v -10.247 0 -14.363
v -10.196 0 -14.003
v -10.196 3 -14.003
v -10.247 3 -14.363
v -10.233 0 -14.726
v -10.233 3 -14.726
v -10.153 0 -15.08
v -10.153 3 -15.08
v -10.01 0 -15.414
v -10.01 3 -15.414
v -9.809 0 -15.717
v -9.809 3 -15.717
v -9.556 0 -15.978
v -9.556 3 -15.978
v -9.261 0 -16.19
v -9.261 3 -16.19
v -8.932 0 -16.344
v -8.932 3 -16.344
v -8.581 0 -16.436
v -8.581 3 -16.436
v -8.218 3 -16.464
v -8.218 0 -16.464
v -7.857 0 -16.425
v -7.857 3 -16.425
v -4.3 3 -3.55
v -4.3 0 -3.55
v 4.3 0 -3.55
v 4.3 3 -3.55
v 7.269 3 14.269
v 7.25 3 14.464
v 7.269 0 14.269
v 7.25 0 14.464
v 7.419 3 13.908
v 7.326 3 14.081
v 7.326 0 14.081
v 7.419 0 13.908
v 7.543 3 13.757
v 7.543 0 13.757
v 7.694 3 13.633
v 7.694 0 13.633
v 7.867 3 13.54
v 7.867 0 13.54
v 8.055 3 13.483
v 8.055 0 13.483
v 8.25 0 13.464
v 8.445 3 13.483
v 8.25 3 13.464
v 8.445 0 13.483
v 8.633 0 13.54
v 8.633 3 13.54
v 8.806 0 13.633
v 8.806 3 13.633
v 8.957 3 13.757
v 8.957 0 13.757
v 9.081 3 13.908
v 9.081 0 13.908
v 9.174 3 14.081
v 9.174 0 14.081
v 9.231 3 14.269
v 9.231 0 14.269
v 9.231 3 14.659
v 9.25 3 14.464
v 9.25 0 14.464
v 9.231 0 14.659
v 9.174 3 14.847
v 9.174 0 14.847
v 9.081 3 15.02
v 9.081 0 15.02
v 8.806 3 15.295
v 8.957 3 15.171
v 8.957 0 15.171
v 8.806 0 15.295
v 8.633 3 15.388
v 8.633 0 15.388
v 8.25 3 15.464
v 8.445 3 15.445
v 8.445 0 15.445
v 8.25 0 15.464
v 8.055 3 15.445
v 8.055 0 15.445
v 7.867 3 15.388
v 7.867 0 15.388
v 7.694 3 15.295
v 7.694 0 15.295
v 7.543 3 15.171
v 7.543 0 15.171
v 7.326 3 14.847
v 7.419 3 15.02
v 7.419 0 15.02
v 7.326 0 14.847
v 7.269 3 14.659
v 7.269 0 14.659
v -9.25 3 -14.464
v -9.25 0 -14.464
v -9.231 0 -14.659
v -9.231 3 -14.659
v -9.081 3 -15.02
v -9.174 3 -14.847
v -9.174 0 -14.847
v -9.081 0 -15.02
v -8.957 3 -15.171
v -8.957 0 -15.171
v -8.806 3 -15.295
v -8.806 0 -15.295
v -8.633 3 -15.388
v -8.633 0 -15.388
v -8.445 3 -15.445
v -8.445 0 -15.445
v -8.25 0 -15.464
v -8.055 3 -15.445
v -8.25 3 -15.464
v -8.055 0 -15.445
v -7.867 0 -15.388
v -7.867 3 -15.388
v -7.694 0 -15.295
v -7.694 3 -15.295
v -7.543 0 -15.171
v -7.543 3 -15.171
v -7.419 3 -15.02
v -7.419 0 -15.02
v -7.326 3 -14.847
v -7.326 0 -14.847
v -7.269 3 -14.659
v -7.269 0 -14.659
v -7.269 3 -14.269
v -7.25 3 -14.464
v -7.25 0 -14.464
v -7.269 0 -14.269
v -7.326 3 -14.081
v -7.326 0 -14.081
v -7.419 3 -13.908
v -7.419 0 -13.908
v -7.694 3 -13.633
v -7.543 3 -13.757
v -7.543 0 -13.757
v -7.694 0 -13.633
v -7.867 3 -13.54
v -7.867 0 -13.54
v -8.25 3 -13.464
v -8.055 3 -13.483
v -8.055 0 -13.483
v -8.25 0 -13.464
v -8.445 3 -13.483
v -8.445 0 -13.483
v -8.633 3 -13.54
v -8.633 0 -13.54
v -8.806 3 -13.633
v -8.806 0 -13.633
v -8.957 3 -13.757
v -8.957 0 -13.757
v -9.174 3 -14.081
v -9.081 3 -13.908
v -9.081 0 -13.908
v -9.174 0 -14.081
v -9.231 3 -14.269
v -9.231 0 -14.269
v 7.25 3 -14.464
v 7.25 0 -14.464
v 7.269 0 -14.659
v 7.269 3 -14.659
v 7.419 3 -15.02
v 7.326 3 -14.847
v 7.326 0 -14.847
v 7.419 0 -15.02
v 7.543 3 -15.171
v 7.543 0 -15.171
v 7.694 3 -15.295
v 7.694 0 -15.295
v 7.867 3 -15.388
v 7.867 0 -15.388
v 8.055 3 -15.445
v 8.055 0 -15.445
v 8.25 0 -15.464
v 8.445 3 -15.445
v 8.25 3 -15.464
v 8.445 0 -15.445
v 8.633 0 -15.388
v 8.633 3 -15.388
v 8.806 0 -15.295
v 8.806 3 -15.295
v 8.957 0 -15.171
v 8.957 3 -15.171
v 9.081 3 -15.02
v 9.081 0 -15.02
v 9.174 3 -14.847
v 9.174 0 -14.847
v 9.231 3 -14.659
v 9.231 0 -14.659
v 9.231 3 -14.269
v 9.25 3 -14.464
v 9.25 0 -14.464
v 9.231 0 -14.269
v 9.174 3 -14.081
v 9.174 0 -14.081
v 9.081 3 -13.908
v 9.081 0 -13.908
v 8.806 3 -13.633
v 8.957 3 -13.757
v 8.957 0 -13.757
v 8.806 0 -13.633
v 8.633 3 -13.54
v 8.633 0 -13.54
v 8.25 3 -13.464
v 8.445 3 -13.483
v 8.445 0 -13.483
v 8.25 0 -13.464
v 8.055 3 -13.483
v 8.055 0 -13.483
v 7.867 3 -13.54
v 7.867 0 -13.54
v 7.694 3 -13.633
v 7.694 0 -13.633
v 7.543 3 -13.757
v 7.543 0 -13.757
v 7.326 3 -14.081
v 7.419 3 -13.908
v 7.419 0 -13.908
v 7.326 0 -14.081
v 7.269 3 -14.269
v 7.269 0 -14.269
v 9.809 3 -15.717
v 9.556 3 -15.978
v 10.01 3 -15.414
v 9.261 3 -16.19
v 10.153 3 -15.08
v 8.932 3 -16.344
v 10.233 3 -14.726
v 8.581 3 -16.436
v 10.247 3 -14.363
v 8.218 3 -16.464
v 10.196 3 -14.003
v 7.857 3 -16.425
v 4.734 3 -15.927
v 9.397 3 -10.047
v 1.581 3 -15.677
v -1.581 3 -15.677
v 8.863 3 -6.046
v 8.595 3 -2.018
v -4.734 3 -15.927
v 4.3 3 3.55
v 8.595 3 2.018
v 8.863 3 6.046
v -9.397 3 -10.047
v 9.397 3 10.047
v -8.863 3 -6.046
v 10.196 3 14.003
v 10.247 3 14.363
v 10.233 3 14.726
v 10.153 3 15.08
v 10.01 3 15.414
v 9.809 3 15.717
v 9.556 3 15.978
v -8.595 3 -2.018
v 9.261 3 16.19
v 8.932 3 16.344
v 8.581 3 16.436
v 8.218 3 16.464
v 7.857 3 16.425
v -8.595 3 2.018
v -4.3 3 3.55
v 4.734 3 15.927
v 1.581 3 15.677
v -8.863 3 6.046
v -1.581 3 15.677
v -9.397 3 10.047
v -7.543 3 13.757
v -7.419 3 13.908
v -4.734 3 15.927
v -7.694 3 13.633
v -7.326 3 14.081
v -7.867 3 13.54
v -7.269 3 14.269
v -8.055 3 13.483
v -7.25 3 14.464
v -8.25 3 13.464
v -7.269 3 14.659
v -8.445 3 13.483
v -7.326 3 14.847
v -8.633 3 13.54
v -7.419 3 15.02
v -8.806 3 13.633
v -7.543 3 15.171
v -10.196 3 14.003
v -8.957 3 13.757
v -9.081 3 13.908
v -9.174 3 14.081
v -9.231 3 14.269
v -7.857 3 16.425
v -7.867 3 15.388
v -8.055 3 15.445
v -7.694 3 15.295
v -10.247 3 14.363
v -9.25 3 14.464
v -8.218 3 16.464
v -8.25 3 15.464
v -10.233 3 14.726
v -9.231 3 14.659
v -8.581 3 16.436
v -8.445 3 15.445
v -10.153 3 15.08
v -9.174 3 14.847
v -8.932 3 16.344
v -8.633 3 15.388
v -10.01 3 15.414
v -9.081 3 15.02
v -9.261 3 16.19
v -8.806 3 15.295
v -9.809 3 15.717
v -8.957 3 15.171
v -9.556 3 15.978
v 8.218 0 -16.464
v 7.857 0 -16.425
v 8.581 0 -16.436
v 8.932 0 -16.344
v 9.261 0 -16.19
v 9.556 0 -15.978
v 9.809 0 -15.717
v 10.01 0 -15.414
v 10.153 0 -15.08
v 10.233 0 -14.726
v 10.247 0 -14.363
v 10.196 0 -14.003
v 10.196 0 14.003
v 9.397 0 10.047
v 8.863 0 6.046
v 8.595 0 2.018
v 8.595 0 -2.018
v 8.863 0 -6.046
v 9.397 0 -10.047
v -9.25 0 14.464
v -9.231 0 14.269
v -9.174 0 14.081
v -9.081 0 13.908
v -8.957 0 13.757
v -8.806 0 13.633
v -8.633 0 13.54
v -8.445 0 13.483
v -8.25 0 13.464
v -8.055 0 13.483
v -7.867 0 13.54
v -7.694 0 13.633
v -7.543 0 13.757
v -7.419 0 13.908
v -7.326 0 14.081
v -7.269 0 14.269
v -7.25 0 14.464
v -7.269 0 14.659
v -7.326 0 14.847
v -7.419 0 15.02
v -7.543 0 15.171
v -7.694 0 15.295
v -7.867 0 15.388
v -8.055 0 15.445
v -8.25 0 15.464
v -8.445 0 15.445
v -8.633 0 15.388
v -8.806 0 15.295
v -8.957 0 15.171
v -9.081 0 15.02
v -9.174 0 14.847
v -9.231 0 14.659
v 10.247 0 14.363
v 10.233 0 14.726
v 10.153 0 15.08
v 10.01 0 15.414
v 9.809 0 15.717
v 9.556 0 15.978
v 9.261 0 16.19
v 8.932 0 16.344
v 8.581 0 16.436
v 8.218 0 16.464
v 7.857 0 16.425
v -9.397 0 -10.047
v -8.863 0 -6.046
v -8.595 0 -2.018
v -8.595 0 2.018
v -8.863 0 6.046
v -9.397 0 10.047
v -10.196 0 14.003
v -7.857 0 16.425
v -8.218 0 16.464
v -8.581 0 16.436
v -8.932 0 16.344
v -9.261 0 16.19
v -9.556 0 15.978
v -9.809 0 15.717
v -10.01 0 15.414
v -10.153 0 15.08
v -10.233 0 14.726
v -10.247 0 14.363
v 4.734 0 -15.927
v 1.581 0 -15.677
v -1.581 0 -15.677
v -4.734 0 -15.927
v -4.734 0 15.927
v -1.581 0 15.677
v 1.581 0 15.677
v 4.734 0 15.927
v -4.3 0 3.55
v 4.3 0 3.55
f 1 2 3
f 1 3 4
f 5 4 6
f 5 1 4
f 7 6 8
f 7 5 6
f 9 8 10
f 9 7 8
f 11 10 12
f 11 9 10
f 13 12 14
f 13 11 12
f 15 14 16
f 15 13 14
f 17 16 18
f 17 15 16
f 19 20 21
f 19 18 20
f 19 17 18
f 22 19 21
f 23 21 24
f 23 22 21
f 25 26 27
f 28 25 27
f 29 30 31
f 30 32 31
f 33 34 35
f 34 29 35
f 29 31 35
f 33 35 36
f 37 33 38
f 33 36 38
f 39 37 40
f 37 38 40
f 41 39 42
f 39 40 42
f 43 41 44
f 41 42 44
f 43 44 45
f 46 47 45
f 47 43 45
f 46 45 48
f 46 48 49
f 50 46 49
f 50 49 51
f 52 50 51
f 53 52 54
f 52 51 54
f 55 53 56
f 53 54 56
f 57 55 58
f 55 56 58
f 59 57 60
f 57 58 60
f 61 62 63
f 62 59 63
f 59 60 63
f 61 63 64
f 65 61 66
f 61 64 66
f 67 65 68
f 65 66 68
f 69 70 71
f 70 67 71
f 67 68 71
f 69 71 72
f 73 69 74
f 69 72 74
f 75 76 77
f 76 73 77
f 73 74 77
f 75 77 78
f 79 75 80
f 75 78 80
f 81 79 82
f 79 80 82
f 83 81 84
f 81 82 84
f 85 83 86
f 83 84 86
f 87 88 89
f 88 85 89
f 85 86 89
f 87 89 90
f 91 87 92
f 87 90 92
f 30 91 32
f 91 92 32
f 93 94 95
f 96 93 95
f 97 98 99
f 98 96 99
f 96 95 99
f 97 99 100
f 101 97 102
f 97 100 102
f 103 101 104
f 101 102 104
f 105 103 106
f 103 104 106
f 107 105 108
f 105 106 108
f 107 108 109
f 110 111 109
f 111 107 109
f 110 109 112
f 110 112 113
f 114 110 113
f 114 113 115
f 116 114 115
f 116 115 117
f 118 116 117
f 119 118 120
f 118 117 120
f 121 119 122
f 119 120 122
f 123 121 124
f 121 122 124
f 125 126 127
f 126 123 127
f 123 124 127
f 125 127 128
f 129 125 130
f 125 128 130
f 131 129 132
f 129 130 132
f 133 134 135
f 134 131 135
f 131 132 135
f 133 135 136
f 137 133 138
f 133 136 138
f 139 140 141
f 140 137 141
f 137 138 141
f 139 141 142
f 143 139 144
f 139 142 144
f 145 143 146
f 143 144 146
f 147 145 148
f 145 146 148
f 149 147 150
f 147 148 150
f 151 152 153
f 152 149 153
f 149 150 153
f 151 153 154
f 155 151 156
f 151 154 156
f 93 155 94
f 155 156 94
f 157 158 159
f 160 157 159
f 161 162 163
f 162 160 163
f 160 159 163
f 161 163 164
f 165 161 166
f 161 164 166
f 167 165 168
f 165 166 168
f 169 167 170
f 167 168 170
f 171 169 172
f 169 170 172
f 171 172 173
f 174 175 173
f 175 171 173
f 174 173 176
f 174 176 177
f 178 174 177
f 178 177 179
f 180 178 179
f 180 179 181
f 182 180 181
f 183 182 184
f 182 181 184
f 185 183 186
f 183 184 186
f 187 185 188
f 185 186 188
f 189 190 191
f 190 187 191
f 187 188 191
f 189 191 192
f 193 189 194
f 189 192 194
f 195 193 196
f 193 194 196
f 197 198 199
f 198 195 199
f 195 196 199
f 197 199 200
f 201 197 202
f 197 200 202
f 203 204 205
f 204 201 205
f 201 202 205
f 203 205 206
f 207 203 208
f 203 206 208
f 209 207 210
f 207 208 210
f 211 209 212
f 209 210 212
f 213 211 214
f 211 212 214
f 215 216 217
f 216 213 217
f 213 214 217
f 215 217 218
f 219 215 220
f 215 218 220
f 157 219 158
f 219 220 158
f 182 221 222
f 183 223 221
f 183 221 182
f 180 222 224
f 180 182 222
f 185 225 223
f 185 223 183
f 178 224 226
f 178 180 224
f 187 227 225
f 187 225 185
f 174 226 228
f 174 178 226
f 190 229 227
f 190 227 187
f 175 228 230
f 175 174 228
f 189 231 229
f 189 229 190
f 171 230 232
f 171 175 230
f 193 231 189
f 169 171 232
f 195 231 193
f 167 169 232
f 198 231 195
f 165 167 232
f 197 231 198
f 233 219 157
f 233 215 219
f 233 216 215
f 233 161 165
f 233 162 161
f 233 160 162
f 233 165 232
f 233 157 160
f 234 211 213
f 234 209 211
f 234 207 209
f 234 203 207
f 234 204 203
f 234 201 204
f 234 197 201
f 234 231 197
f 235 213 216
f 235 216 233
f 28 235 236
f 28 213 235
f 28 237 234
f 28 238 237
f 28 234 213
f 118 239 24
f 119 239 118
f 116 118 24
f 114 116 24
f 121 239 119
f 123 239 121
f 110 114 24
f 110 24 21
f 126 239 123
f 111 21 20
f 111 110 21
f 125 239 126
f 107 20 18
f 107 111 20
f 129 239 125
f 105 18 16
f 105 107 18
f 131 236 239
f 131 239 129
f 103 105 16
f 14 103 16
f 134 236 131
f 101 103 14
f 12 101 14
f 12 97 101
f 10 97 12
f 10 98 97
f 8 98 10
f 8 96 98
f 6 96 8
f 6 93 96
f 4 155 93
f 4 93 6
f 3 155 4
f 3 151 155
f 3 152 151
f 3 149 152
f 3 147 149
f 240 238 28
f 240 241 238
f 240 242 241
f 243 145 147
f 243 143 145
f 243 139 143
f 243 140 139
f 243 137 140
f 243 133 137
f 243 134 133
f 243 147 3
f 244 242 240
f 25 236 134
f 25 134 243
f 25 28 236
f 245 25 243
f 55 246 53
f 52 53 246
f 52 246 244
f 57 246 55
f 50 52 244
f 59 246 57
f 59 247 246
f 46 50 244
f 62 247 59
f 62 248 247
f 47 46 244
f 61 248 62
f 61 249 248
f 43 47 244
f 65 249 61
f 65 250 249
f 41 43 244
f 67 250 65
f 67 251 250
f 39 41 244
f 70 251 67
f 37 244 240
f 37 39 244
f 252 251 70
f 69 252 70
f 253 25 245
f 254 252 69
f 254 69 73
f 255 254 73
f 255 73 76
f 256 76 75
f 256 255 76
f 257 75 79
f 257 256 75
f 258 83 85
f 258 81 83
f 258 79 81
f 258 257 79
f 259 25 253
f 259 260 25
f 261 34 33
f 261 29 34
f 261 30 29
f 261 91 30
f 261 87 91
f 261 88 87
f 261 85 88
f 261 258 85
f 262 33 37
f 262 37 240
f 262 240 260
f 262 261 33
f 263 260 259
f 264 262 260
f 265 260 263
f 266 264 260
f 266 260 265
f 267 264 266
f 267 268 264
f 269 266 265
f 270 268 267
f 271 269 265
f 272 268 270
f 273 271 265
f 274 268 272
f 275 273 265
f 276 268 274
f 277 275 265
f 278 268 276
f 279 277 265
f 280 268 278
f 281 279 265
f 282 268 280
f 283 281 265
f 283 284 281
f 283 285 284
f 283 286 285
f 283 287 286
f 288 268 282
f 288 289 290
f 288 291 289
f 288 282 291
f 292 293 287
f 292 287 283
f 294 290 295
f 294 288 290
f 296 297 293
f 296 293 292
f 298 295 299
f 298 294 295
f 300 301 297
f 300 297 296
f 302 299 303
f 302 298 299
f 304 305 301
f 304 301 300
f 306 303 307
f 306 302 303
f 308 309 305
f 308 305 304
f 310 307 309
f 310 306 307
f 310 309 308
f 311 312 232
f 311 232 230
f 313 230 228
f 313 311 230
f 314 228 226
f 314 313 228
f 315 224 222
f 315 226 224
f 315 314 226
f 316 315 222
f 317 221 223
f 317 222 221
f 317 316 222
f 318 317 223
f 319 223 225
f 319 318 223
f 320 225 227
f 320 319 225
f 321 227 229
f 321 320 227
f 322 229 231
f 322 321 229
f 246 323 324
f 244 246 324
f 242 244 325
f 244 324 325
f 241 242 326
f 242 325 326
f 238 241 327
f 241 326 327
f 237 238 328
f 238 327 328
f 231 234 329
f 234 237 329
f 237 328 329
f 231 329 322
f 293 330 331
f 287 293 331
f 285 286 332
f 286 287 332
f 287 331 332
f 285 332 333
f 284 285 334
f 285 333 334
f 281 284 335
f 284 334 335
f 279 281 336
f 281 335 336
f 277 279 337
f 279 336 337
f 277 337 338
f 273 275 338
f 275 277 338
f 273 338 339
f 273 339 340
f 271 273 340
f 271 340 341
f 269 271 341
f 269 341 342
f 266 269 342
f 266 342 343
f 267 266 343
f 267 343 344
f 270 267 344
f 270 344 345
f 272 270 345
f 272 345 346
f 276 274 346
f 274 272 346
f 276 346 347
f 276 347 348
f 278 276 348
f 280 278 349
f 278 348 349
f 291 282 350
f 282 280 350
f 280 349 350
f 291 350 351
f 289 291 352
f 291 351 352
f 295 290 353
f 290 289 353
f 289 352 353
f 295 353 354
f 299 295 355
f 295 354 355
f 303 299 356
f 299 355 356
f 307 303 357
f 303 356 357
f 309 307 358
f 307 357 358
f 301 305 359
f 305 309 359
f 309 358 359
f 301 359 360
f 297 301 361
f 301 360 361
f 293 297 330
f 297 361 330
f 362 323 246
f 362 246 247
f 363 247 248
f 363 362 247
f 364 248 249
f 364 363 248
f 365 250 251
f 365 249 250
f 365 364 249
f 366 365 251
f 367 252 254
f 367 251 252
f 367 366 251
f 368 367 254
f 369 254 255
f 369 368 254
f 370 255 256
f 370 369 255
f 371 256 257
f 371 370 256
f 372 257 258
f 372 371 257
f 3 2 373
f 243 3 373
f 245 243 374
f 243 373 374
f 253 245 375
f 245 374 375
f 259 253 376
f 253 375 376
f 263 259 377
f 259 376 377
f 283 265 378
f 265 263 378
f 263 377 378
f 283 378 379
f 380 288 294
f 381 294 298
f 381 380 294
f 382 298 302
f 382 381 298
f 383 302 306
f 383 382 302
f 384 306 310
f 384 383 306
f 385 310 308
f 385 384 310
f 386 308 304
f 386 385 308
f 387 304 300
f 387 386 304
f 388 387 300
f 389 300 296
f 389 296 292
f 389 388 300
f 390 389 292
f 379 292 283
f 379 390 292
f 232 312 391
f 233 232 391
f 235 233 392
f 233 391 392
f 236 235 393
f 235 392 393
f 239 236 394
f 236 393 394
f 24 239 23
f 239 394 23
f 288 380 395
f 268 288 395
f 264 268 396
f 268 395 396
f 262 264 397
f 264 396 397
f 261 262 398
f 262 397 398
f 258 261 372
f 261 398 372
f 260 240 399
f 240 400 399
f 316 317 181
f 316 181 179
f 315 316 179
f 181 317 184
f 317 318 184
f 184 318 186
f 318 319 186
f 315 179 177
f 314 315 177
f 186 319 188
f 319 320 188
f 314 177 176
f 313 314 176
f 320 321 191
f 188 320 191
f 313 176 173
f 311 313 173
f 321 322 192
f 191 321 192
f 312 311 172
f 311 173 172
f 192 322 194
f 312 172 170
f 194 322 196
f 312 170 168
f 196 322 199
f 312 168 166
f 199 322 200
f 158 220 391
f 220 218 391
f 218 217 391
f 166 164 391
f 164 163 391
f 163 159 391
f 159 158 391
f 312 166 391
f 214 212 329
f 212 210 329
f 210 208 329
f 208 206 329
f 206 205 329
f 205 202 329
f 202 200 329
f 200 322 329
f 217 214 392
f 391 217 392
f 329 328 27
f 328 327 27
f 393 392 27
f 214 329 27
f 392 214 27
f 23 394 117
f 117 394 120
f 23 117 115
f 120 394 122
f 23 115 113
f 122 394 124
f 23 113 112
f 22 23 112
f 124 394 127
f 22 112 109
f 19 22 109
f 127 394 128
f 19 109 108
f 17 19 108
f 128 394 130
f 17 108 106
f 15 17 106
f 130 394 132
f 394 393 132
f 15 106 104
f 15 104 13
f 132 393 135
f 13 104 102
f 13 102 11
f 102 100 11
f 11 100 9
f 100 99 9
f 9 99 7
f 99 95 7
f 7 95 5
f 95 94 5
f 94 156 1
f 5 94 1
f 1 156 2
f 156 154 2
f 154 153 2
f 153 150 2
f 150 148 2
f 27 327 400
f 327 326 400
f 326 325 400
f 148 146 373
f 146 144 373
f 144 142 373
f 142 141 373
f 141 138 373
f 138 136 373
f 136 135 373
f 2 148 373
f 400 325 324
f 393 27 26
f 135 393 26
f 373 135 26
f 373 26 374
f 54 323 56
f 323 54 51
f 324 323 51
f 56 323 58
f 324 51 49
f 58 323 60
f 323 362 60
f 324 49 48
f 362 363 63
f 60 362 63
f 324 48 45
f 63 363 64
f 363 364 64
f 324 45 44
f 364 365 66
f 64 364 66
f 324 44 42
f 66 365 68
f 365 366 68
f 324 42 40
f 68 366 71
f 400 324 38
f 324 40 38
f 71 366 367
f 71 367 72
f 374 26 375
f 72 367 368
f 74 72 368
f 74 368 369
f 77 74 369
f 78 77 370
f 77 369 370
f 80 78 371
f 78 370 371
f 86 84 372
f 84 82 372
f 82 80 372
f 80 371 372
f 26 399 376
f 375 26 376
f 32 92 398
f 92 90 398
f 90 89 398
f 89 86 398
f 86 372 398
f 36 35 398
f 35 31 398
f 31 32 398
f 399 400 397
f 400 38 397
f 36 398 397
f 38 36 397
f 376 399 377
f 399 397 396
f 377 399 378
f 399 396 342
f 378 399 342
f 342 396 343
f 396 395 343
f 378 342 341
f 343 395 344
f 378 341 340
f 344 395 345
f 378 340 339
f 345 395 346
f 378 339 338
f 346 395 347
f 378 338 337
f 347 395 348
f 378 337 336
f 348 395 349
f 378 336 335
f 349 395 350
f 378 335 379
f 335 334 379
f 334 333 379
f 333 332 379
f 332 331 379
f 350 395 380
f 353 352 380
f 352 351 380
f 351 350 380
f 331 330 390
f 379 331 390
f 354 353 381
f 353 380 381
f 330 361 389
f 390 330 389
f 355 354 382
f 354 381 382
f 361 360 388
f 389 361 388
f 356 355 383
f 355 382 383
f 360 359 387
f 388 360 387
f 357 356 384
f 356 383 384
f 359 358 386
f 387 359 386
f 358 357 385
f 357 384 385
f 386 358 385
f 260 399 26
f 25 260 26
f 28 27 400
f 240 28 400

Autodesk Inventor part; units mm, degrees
ref_plane "YZ Plane" through (0, 0, 0) normal (1, 0, 0) x (0, 1, 0)
ref_plane "XZ Plane" through (0, 0, 0) normal (0, 1, 0) x (-1, 0, 0)
ref_plane "XY Plane" through (0, 0, 0) normal (0, 0, 1) x (1, 0, 0)
sketch "Sketch1" plane through (0, 0, 0) normal (0, 1, 0) x (-1, 0, 0)
  line L0 (-8.25, 14.464) -> (8.25, 14.464) construction
  line L1 (8.25, 14.464) -> (8.25, -14.464) construction
  line L2 (8.25, -14.464) -> (-8.25, -14.464) construction
  line L3 (-8.25, -14.464) -> (-8.25, 14.464) construction
  line L4 (-8.25, 14.464) -> (8.25, -14.464) construction
  line L5 (8.25, 14.464) -> (-8.25, -14.464) construction
  circle A0 centre (8.25, 14.464) radius 1
  circle A1 centre (8.25, -14.464) radius 1
  circle A2 centre (-8.25, -14.464) radius 1
  circle A3 centre (-8.25, 14.464) radius 1
  line L6 (-4.3, 3.55) -> (4.3, 3.55)
  line L7 (4.3, 3.55) -> (4.3, -3.55)
  line L8 (4.3, -3.55) -> (-4.3, -3.55)
  line L9 (-4.3, -3.55) -> (-4.3, 3.55)
  line L10 (-4.3, 3.55) -> (4.3, -3.55) construction
  line L11 (4.3, 3.55) -> (-4.3, -3.55) construction
  circle A4 centre (8.25, 14.464) radius 2
  circle A5 centre (8.25, -14.464) radius 2
  circle A6 centre (-8.25, -14.464) radius 2
  circle A7 centre (-8.25, 14.464) radius 2
  arc A8 (10.1962, 14.0034) -> (10.1962, -14.0034) centre (69.3616, 0) ccw
  arc A9 (-10.1962, -14.0034) -> (-10.1962, 14.0034) centre (-69.3616, 0) ccw
  arc A10 (7.8571, -16.425) -> (-7.8571, -16.425) centre (0, -55.6458) ccw
  arc A11 (-7.8571, 16.425) -> (7.8571, 16.425) centre (0, 55.6458) ccw
  point P0 (0, 0)
  dimension "d0" = 16.5
  dimension "d1" = 28.928
  dimension "d2" = 2
  dimension "d3" = 2
  dimension "d4" = 2
  dimension "d5" = 2
  dimension "d6" = 8.6
  dimension "d7" = 7.1
  dimension "d8" = 4
  dimension "d9" = 4
  dimension "d10" = 4
  dimension "d11" = 4
  dimension "d12" = 60.8
  dimension "d13" = 60.8
  dimension "d14" = 40
  dimension "d15" = 40
extrude "Extrusion1" add sketch "Sketch1" along normal blind 3
properties part number "Seal_plate"
